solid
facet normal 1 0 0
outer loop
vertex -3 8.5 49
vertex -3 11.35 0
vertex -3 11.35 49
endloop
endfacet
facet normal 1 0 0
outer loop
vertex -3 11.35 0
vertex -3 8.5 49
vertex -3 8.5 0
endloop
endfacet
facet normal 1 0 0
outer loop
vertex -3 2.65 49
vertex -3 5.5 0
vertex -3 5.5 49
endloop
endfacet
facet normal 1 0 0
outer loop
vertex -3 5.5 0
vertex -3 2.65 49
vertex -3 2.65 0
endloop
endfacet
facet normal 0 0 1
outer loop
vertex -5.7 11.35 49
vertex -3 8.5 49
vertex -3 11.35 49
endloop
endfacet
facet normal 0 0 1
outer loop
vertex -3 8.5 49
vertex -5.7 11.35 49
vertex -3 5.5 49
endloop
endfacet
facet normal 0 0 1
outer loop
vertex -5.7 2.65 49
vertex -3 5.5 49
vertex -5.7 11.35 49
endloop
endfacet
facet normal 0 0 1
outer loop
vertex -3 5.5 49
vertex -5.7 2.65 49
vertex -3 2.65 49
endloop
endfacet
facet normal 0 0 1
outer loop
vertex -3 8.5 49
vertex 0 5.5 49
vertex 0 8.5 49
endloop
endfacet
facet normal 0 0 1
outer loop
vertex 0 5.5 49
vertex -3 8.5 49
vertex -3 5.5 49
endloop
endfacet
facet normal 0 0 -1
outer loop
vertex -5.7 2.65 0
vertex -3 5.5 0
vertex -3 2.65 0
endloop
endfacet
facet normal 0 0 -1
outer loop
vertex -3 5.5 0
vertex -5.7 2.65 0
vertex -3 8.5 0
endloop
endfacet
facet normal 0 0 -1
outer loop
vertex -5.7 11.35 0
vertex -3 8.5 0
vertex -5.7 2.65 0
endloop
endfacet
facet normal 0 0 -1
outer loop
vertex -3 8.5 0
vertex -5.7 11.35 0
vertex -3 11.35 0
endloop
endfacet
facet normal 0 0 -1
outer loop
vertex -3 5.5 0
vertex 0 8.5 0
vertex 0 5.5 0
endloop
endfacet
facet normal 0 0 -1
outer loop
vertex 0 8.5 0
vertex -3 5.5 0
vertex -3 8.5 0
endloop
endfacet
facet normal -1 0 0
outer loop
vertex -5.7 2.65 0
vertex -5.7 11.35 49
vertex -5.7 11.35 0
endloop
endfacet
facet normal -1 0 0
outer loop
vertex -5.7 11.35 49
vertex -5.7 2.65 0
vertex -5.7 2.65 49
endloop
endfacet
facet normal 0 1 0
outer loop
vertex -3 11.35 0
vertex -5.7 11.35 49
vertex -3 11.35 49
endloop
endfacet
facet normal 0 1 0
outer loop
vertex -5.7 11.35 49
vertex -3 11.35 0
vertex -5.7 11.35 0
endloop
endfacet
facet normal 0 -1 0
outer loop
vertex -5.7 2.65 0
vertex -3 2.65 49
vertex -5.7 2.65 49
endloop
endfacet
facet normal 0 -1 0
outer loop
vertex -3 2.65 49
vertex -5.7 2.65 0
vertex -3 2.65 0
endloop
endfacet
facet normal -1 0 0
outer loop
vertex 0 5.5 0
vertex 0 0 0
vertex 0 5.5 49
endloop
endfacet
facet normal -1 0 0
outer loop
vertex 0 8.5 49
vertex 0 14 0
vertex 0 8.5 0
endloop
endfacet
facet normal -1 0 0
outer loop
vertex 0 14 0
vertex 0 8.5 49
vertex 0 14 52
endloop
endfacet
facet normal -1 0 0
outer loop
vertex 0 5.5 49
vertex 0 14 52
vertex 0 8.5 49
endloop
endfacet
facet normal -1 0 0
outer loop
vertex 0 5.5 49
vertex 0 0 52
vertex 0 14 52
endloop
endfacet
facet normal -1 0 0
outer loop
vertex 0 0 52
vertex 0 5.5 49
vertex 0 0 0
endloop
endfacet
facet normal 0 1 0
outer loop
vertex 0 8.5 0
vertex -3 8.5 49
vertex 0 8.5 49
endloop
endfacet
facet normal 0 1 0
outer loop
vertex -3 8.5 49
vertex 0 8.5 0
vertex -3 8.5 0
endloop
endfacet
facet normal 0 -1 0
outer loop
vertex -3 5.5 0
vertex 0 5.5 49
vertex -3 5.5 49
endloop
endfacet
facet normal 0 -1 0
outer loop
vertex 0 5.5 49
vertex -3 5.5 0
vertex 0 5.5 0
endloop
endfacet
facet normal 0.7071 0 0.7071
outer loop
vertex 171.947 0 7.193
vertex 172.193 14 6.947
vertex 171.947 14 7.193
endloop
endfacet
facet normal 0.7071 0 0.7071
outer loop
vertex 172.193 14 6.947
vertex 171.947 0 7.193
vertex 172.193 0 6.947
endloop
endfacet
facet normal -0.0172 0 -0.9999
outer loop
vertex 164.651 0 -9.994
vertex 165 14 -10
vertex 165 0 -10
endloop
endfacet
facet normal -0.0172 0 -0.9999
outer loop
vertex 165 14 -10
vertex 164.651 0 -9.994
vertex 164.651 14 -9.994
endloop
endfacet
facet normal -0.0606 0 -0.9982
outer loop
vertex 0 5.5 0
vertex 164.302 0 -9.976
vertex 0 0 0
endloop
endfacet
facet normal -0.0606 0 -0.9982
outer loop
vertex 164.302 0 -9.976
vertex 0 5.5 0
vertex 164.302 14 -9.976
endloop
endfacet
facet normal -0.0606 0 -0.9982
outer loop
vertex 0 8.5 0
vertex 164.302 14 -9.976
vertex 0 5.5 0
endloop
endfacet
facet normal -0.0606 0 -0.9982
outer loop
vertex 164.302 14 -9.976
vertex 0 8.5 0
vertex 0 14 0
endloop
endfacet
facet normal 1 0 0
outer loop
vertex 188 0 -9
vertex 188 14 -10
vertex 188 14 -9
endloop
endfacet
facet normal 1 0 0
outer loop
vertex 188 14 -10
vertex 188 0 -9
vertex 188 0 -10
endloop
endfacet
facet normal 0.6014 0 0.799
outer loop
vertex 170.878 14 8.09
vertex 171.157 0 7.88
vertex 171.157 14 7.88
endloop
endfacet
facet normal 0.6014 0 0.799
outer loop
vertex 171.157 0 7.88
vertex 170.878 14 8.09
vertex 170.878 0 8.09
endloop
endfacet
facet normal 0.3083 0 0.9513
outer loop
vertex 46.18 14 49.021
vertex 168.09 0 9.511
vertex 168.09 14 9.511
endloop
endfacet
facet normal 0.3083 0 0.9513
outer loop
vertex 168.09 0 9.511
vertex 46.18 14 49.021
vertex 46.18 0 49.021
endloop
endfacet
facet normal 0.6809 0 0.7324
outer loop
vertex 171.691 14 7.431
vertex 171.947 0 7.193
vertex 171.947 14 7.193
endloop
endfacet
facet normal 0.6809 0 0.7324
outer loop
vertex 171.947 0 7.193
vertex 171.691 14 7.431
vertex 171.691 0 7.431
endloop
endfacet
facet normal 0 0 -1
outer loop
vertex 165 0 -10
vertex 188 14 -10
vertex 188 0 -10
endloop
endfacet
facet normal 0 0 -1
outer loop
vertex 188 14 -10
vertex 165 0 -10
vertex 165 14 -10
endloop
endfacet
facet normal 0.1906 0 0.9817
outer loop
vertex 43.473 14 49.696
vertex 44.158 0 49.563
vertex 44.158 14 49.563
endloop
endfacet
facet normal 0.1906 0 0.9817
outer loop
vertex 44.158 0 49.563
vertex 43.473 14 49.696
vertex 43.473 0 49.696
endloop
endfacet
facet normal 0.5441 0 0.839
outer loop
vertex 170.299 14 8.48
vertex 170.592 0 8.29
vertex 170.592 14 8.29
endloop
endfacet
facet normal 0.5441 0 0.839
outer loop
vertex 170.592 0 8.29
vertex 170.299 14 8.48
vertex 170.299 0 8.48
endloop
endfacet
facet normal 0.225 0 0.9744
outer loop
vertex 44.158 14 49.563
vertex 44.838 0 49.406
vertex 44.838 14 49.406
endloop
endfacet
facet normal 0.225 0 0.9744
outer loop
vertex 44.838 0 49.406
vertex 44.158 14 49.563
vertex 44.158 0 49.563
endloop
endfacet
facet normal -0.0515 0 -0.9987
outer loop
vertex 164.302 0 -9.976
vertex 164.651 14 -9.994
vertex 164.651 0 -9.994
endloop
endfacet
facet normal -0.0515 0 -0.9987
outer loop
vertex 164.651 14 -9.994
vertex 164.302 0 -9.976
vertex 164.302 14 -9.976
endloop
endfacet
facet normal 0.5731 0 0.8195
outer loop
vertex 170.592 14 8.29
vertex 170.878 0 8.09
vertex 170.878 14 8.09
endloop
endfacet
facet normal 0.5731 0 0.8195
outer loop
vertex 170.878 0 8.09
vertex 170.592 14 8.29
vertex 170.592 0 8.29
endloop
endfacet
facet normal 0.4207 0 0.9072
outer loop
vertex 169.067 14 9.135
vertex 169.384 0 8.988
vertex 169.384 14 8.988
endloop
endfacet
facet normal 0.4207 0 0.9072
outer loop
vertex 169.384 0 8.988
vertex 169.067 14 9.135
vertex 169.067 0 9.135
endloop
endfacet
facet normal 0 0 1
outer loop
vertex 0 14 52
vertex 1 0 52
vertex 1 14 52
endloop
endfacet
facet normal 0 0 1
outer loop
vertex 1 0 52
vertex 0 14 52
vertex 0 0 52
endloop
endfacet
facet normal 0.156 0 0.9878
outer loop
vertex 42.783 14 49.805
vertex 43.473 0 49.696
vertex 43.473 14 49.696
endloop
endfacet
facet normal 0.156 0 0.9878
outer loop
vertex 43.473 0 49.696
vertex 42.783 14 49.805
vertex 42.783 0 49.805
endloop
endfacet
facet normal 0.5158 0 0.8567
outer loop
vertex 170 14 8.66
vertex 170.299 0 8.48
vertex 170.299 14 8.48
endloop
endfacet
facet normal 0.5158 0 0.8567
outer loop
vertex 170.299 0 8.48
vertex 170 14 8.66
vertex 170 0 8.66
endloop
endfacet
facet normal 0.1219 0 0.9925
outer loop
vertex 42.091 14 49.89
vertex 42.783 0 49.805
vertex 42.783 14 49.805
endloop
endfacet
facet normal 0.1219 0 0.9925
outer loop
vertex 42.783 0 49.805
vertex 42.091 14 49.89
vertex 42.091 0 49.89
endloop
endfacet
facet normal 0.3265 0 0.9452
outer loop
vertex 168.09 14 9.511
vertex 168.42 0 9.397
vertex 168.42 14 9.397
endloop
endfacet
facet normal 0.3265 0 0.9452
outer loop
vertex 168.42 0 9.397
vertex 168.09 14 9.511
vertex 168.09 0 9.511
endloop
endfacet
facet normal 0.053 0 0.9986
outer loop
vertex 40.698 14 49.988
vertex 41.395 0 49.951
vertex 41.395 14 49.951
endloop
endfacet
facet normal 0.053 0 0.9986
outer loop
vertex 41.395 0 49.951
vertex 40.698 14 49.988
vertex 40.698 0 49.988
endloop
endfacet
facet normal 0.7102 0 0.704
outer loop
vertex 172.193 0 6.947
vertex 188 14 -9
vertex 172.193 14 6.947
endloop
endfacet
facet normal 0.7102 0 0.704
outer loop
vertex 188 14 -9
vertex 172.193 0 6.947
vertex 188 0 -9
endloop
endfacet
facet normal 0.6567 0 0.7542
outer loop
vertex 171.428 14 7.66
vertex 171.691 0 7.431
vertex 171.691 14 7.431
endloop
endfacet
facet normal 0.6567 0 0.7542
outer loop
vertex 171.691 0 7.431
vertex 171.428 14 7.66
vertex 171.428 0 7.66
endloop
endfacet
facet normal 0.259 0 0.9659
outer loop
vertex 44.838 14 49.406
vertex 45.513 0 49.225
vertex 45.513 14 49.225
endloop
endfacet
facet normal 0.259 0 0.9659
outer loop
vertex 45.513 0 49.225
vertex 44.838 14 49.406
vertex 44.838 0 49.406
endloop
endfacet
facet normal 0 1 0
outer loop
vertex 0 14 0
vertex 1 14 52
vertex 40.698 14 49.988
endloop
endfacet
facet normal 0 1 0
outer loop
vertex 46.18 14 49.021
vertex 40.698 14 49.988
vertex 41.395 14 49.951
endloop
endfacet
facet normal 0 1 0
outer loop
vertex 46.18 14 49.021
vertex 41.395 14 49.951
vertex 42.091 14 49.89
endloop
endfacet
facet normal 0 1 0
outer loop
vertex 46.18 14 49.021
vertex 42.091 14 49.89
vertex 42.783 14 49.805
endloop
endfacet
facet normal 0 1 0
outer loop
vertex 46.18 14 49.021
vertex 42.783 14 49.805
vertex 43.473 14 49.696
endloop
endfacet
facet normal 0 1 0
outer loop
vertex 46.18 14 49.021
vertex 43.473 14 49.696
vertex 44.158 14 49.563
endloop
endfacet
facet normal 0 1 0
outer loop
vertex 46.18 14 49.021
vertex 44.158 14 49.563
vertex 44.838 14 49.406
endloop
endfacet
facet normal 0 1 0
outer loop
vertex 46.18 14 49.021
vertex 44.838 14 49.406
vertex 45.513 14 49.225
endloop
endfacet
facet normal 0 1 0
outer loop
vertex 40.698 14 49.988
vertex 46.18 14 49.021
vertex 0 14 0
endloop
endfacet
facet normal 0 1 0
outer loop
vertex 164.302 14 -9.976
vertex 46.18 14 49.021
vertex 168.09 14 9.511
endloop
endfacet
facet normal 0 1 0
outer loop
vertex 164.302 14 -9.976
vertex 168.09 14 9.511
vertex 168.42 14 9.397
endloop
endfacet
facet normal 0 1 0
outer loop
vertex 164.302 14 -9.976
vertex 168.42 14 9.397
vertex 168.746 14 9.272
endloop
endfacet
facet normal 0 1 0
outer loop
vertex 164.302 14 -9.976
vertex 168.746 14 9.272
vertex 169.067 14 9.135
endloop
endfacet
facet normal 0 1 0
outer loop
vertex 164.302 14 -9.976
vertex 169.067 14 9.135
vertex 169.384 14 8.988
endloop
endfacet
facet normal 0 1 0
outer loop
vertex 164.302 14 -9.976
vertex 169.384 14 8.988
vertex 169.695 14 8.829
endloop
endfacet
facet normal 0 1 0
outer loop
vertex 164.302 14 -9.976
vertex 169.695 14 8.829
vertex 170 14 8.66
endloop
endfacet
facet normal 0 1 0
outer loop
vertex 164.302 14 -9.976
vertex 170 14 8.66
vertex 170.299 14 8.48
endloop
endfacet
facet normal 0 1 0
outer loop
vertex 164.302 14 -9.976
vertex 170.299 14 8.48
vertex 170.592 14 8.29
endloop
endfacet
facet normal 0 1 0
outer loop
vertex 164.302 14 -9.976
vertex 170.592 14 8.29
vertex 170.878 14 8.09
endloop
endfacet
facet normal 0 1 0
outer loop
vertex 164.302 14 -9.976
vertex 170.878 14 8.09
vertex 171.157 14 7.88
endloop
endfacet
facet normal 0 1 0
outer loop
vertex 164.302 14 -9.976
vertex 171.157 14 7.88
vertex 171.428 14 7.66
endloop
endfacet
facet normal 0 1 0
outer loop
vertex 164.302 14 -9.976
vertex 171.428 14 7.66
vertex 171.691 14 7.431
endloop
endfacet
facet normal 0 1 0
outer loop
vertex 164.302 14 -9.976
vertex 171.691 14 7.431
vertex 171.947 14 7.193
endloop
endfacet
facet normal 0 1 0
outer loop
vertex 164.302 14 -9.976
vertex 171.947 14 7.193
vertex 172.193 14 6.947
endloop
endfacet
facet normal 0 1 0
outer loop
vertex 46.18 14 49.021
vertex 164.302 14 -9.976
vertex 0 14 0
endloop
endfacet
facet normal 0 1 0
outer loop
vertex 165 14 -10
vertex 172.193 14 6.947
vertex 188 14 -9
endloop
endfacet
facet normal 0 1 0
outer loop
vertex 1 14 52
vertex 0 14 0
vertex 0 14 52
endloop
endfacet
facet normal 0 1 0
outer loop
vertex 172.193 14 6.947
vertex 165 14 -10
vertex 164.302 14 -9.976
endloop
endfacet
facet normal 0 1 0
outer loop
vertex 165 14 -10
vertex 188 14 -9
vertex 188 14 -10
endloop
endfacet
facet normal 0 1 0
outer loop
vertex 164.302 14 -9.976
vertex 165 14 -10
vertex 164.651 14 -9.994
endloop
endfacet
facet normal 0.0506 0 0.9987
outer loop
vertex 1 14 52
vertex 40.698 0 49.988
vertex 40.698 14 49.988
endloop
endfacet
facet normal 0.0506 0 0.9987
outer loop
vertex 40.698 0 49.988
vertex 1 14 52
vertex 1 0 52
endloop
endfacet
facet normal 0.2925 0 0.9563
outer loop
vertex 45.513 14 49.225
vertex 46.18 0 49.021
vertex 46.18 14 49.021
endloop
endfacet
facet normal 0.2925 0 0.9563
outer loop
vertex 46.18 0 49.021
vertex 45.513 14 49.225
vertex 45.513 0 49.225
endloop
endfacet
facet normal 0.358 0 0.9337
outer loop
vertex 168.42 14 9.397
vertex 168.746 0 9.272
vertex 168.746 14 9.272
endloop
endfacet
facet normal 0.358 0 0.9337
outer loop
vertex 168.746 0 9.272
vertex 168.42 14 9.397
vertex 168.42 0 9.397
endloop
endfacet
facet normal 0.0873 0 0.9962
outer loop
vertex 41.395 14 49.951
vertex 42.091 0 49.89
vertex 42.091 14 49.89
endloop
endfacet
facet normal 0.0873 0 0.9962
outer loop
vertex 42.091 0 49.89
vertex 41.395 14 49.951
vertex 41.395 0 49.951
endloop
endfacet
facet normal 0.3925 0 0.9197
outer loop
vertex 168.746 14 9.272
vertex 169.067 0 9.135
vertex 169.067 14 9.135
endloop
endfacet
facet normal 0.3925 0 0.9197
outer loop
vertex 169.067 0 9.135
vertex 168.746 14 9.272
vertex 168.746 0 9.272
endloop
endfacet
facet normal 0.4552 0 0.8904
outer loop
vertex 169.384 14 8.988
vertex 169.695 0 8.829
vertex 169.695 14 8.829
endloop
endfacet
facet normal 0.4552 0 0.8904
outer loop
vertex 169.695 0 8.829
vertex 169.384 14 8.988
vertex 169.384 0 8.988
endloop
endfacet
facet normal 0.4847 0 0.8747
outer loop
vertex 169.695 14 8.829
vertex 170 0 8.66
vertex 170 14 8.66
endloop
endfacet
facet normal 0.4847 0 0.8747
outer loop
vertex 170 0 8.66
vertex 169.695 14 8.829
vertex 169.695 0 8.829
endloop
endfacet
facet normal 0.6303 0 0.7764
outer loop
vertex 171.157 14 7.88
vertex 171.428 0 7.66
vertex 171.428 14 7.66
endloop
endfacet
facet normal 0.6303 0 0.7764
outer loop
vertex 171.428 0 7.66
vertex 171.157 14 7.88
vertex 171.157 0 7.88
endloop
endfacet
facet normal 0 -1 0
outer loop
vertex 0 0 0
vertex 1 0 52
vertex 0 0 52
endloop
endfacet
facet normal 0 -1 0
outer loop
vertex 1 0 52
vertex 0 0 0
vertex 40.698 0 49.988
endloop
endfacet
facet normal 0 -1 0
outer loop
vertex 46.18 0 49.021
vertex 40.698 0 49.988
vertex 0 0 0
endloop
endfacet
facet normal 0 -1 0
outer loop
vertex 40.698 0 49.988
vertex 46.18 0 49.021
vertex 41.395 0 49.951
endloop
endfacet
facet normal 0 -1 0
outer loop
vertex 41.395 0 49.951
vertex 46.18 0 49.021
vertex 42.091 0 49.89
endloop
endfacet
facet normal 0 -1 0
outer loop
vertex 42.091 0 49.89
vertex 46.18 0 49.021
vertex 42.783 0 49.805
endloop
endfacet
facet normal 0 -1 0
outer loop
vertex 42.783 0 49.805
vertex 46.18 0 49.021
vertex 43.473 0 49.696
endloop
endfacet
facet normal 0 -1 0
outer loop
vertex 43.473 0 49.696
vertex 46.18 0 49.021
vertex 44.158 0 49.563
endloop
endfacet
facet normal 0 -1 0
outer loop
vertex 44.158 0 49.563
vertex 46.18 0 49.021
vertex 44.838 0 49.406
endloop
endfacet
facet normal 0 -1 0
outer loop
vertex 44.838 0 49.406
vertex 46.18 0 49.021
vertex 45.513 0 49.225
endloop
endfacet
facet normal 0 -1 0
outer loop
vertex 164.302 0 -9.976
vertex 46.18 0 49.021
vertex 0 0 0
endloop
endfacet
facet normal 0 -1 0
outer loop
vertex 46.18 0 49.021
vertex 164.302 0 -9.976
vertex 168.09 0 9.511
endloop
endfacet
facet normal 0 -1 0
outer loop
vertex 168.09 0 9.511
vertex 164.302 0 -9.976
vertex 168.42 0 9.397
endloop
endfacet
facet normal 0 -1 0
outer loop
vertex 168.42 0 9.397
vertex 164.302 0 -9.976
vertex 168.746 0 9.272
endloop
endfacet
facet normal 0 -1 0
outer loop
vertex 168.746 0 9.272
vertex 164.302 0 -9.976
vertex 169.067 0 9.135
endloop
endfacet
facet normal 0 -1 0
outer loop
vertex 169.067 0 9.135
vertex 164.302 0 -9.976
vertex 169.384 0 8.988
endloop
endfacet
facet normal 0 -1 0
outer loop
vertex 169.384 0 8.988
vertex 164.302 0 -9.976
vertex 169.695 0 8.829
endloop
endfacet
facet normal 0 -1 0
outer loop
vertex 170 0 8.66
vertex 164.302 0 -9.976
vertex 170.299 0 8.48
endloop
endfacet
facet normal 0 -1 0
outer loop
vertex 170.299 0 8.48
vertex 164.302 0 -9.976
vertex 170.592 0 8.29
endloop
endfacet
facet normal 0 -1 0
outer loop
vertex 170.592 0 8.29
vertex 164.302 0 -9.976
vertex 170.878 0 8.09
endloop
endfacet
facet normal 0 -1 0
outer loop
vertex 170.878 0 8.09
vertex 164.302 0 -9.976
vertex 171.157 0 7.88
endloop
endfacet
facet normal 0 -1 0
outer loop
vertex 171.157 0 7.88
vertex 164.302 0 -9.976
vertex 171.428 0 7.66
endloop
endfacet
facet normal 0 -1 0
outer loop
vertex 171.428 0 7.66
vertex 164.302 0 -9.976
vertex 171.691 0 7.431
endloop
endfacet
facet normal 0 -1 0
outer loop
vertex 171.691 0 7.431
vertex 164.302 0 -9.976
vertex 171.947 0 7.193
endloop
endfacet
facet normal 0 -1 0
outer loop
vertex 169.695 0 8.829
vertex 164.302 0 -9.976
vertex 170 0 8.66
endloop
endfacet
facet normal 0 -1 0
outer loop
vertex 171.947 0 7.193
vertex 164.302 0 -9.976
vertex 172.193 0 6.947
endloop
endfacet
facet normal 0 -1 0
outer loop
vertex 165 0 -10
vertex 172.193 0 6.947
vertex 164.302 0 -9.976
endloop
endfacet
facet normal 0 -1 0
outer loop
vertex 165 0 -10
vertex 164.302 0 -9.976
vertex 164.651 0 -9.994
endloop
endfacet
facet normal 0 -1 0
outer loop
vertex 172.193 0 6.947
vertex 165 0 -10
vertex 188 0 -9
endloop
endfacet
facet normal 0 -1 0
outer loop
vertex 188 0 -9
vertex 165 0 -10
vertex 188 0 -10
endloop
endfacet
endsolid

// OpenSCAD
leg_length=187;
leg_thickness=14;
leg_height=52;
foot_length=22;
foot_transition=8;
connector_length=49;
connector_thickness=8.7;
connector_depth=2.7;
connector_bridge_thickness=3;
$fn=180;

union() {
  //connector
  translate([-connector_bridge_thickness-connector_depth, leg_thickness/2-connector_thickness/2, 0])
  cube([connector_depth, connector_thickness, connector_length]);

  //connector bridge
  translate([-connector_bridge_thickness, leg_thickness/2-connector_bridge_thickness/2, 0])
  cube([connector_bridge_thickness, connector_bridge_thickness, connector_length]);

  hull() {
    cube([1, leg_thickness, leg_height]);

    translate([40, leg_thickness, 30])
    rotate([90, 0, 0])
    cylinder(d=40, h=leg_thickness);

    translate([leg_length-foot_length, leg_thickness, 0])
    rotate([90, 0, 0])
    cylinder(d=20, h=leg_thickness);

    translate([leg_length, 0, -10])
    cube([1, leg_thickness, 1]);
  }
}
